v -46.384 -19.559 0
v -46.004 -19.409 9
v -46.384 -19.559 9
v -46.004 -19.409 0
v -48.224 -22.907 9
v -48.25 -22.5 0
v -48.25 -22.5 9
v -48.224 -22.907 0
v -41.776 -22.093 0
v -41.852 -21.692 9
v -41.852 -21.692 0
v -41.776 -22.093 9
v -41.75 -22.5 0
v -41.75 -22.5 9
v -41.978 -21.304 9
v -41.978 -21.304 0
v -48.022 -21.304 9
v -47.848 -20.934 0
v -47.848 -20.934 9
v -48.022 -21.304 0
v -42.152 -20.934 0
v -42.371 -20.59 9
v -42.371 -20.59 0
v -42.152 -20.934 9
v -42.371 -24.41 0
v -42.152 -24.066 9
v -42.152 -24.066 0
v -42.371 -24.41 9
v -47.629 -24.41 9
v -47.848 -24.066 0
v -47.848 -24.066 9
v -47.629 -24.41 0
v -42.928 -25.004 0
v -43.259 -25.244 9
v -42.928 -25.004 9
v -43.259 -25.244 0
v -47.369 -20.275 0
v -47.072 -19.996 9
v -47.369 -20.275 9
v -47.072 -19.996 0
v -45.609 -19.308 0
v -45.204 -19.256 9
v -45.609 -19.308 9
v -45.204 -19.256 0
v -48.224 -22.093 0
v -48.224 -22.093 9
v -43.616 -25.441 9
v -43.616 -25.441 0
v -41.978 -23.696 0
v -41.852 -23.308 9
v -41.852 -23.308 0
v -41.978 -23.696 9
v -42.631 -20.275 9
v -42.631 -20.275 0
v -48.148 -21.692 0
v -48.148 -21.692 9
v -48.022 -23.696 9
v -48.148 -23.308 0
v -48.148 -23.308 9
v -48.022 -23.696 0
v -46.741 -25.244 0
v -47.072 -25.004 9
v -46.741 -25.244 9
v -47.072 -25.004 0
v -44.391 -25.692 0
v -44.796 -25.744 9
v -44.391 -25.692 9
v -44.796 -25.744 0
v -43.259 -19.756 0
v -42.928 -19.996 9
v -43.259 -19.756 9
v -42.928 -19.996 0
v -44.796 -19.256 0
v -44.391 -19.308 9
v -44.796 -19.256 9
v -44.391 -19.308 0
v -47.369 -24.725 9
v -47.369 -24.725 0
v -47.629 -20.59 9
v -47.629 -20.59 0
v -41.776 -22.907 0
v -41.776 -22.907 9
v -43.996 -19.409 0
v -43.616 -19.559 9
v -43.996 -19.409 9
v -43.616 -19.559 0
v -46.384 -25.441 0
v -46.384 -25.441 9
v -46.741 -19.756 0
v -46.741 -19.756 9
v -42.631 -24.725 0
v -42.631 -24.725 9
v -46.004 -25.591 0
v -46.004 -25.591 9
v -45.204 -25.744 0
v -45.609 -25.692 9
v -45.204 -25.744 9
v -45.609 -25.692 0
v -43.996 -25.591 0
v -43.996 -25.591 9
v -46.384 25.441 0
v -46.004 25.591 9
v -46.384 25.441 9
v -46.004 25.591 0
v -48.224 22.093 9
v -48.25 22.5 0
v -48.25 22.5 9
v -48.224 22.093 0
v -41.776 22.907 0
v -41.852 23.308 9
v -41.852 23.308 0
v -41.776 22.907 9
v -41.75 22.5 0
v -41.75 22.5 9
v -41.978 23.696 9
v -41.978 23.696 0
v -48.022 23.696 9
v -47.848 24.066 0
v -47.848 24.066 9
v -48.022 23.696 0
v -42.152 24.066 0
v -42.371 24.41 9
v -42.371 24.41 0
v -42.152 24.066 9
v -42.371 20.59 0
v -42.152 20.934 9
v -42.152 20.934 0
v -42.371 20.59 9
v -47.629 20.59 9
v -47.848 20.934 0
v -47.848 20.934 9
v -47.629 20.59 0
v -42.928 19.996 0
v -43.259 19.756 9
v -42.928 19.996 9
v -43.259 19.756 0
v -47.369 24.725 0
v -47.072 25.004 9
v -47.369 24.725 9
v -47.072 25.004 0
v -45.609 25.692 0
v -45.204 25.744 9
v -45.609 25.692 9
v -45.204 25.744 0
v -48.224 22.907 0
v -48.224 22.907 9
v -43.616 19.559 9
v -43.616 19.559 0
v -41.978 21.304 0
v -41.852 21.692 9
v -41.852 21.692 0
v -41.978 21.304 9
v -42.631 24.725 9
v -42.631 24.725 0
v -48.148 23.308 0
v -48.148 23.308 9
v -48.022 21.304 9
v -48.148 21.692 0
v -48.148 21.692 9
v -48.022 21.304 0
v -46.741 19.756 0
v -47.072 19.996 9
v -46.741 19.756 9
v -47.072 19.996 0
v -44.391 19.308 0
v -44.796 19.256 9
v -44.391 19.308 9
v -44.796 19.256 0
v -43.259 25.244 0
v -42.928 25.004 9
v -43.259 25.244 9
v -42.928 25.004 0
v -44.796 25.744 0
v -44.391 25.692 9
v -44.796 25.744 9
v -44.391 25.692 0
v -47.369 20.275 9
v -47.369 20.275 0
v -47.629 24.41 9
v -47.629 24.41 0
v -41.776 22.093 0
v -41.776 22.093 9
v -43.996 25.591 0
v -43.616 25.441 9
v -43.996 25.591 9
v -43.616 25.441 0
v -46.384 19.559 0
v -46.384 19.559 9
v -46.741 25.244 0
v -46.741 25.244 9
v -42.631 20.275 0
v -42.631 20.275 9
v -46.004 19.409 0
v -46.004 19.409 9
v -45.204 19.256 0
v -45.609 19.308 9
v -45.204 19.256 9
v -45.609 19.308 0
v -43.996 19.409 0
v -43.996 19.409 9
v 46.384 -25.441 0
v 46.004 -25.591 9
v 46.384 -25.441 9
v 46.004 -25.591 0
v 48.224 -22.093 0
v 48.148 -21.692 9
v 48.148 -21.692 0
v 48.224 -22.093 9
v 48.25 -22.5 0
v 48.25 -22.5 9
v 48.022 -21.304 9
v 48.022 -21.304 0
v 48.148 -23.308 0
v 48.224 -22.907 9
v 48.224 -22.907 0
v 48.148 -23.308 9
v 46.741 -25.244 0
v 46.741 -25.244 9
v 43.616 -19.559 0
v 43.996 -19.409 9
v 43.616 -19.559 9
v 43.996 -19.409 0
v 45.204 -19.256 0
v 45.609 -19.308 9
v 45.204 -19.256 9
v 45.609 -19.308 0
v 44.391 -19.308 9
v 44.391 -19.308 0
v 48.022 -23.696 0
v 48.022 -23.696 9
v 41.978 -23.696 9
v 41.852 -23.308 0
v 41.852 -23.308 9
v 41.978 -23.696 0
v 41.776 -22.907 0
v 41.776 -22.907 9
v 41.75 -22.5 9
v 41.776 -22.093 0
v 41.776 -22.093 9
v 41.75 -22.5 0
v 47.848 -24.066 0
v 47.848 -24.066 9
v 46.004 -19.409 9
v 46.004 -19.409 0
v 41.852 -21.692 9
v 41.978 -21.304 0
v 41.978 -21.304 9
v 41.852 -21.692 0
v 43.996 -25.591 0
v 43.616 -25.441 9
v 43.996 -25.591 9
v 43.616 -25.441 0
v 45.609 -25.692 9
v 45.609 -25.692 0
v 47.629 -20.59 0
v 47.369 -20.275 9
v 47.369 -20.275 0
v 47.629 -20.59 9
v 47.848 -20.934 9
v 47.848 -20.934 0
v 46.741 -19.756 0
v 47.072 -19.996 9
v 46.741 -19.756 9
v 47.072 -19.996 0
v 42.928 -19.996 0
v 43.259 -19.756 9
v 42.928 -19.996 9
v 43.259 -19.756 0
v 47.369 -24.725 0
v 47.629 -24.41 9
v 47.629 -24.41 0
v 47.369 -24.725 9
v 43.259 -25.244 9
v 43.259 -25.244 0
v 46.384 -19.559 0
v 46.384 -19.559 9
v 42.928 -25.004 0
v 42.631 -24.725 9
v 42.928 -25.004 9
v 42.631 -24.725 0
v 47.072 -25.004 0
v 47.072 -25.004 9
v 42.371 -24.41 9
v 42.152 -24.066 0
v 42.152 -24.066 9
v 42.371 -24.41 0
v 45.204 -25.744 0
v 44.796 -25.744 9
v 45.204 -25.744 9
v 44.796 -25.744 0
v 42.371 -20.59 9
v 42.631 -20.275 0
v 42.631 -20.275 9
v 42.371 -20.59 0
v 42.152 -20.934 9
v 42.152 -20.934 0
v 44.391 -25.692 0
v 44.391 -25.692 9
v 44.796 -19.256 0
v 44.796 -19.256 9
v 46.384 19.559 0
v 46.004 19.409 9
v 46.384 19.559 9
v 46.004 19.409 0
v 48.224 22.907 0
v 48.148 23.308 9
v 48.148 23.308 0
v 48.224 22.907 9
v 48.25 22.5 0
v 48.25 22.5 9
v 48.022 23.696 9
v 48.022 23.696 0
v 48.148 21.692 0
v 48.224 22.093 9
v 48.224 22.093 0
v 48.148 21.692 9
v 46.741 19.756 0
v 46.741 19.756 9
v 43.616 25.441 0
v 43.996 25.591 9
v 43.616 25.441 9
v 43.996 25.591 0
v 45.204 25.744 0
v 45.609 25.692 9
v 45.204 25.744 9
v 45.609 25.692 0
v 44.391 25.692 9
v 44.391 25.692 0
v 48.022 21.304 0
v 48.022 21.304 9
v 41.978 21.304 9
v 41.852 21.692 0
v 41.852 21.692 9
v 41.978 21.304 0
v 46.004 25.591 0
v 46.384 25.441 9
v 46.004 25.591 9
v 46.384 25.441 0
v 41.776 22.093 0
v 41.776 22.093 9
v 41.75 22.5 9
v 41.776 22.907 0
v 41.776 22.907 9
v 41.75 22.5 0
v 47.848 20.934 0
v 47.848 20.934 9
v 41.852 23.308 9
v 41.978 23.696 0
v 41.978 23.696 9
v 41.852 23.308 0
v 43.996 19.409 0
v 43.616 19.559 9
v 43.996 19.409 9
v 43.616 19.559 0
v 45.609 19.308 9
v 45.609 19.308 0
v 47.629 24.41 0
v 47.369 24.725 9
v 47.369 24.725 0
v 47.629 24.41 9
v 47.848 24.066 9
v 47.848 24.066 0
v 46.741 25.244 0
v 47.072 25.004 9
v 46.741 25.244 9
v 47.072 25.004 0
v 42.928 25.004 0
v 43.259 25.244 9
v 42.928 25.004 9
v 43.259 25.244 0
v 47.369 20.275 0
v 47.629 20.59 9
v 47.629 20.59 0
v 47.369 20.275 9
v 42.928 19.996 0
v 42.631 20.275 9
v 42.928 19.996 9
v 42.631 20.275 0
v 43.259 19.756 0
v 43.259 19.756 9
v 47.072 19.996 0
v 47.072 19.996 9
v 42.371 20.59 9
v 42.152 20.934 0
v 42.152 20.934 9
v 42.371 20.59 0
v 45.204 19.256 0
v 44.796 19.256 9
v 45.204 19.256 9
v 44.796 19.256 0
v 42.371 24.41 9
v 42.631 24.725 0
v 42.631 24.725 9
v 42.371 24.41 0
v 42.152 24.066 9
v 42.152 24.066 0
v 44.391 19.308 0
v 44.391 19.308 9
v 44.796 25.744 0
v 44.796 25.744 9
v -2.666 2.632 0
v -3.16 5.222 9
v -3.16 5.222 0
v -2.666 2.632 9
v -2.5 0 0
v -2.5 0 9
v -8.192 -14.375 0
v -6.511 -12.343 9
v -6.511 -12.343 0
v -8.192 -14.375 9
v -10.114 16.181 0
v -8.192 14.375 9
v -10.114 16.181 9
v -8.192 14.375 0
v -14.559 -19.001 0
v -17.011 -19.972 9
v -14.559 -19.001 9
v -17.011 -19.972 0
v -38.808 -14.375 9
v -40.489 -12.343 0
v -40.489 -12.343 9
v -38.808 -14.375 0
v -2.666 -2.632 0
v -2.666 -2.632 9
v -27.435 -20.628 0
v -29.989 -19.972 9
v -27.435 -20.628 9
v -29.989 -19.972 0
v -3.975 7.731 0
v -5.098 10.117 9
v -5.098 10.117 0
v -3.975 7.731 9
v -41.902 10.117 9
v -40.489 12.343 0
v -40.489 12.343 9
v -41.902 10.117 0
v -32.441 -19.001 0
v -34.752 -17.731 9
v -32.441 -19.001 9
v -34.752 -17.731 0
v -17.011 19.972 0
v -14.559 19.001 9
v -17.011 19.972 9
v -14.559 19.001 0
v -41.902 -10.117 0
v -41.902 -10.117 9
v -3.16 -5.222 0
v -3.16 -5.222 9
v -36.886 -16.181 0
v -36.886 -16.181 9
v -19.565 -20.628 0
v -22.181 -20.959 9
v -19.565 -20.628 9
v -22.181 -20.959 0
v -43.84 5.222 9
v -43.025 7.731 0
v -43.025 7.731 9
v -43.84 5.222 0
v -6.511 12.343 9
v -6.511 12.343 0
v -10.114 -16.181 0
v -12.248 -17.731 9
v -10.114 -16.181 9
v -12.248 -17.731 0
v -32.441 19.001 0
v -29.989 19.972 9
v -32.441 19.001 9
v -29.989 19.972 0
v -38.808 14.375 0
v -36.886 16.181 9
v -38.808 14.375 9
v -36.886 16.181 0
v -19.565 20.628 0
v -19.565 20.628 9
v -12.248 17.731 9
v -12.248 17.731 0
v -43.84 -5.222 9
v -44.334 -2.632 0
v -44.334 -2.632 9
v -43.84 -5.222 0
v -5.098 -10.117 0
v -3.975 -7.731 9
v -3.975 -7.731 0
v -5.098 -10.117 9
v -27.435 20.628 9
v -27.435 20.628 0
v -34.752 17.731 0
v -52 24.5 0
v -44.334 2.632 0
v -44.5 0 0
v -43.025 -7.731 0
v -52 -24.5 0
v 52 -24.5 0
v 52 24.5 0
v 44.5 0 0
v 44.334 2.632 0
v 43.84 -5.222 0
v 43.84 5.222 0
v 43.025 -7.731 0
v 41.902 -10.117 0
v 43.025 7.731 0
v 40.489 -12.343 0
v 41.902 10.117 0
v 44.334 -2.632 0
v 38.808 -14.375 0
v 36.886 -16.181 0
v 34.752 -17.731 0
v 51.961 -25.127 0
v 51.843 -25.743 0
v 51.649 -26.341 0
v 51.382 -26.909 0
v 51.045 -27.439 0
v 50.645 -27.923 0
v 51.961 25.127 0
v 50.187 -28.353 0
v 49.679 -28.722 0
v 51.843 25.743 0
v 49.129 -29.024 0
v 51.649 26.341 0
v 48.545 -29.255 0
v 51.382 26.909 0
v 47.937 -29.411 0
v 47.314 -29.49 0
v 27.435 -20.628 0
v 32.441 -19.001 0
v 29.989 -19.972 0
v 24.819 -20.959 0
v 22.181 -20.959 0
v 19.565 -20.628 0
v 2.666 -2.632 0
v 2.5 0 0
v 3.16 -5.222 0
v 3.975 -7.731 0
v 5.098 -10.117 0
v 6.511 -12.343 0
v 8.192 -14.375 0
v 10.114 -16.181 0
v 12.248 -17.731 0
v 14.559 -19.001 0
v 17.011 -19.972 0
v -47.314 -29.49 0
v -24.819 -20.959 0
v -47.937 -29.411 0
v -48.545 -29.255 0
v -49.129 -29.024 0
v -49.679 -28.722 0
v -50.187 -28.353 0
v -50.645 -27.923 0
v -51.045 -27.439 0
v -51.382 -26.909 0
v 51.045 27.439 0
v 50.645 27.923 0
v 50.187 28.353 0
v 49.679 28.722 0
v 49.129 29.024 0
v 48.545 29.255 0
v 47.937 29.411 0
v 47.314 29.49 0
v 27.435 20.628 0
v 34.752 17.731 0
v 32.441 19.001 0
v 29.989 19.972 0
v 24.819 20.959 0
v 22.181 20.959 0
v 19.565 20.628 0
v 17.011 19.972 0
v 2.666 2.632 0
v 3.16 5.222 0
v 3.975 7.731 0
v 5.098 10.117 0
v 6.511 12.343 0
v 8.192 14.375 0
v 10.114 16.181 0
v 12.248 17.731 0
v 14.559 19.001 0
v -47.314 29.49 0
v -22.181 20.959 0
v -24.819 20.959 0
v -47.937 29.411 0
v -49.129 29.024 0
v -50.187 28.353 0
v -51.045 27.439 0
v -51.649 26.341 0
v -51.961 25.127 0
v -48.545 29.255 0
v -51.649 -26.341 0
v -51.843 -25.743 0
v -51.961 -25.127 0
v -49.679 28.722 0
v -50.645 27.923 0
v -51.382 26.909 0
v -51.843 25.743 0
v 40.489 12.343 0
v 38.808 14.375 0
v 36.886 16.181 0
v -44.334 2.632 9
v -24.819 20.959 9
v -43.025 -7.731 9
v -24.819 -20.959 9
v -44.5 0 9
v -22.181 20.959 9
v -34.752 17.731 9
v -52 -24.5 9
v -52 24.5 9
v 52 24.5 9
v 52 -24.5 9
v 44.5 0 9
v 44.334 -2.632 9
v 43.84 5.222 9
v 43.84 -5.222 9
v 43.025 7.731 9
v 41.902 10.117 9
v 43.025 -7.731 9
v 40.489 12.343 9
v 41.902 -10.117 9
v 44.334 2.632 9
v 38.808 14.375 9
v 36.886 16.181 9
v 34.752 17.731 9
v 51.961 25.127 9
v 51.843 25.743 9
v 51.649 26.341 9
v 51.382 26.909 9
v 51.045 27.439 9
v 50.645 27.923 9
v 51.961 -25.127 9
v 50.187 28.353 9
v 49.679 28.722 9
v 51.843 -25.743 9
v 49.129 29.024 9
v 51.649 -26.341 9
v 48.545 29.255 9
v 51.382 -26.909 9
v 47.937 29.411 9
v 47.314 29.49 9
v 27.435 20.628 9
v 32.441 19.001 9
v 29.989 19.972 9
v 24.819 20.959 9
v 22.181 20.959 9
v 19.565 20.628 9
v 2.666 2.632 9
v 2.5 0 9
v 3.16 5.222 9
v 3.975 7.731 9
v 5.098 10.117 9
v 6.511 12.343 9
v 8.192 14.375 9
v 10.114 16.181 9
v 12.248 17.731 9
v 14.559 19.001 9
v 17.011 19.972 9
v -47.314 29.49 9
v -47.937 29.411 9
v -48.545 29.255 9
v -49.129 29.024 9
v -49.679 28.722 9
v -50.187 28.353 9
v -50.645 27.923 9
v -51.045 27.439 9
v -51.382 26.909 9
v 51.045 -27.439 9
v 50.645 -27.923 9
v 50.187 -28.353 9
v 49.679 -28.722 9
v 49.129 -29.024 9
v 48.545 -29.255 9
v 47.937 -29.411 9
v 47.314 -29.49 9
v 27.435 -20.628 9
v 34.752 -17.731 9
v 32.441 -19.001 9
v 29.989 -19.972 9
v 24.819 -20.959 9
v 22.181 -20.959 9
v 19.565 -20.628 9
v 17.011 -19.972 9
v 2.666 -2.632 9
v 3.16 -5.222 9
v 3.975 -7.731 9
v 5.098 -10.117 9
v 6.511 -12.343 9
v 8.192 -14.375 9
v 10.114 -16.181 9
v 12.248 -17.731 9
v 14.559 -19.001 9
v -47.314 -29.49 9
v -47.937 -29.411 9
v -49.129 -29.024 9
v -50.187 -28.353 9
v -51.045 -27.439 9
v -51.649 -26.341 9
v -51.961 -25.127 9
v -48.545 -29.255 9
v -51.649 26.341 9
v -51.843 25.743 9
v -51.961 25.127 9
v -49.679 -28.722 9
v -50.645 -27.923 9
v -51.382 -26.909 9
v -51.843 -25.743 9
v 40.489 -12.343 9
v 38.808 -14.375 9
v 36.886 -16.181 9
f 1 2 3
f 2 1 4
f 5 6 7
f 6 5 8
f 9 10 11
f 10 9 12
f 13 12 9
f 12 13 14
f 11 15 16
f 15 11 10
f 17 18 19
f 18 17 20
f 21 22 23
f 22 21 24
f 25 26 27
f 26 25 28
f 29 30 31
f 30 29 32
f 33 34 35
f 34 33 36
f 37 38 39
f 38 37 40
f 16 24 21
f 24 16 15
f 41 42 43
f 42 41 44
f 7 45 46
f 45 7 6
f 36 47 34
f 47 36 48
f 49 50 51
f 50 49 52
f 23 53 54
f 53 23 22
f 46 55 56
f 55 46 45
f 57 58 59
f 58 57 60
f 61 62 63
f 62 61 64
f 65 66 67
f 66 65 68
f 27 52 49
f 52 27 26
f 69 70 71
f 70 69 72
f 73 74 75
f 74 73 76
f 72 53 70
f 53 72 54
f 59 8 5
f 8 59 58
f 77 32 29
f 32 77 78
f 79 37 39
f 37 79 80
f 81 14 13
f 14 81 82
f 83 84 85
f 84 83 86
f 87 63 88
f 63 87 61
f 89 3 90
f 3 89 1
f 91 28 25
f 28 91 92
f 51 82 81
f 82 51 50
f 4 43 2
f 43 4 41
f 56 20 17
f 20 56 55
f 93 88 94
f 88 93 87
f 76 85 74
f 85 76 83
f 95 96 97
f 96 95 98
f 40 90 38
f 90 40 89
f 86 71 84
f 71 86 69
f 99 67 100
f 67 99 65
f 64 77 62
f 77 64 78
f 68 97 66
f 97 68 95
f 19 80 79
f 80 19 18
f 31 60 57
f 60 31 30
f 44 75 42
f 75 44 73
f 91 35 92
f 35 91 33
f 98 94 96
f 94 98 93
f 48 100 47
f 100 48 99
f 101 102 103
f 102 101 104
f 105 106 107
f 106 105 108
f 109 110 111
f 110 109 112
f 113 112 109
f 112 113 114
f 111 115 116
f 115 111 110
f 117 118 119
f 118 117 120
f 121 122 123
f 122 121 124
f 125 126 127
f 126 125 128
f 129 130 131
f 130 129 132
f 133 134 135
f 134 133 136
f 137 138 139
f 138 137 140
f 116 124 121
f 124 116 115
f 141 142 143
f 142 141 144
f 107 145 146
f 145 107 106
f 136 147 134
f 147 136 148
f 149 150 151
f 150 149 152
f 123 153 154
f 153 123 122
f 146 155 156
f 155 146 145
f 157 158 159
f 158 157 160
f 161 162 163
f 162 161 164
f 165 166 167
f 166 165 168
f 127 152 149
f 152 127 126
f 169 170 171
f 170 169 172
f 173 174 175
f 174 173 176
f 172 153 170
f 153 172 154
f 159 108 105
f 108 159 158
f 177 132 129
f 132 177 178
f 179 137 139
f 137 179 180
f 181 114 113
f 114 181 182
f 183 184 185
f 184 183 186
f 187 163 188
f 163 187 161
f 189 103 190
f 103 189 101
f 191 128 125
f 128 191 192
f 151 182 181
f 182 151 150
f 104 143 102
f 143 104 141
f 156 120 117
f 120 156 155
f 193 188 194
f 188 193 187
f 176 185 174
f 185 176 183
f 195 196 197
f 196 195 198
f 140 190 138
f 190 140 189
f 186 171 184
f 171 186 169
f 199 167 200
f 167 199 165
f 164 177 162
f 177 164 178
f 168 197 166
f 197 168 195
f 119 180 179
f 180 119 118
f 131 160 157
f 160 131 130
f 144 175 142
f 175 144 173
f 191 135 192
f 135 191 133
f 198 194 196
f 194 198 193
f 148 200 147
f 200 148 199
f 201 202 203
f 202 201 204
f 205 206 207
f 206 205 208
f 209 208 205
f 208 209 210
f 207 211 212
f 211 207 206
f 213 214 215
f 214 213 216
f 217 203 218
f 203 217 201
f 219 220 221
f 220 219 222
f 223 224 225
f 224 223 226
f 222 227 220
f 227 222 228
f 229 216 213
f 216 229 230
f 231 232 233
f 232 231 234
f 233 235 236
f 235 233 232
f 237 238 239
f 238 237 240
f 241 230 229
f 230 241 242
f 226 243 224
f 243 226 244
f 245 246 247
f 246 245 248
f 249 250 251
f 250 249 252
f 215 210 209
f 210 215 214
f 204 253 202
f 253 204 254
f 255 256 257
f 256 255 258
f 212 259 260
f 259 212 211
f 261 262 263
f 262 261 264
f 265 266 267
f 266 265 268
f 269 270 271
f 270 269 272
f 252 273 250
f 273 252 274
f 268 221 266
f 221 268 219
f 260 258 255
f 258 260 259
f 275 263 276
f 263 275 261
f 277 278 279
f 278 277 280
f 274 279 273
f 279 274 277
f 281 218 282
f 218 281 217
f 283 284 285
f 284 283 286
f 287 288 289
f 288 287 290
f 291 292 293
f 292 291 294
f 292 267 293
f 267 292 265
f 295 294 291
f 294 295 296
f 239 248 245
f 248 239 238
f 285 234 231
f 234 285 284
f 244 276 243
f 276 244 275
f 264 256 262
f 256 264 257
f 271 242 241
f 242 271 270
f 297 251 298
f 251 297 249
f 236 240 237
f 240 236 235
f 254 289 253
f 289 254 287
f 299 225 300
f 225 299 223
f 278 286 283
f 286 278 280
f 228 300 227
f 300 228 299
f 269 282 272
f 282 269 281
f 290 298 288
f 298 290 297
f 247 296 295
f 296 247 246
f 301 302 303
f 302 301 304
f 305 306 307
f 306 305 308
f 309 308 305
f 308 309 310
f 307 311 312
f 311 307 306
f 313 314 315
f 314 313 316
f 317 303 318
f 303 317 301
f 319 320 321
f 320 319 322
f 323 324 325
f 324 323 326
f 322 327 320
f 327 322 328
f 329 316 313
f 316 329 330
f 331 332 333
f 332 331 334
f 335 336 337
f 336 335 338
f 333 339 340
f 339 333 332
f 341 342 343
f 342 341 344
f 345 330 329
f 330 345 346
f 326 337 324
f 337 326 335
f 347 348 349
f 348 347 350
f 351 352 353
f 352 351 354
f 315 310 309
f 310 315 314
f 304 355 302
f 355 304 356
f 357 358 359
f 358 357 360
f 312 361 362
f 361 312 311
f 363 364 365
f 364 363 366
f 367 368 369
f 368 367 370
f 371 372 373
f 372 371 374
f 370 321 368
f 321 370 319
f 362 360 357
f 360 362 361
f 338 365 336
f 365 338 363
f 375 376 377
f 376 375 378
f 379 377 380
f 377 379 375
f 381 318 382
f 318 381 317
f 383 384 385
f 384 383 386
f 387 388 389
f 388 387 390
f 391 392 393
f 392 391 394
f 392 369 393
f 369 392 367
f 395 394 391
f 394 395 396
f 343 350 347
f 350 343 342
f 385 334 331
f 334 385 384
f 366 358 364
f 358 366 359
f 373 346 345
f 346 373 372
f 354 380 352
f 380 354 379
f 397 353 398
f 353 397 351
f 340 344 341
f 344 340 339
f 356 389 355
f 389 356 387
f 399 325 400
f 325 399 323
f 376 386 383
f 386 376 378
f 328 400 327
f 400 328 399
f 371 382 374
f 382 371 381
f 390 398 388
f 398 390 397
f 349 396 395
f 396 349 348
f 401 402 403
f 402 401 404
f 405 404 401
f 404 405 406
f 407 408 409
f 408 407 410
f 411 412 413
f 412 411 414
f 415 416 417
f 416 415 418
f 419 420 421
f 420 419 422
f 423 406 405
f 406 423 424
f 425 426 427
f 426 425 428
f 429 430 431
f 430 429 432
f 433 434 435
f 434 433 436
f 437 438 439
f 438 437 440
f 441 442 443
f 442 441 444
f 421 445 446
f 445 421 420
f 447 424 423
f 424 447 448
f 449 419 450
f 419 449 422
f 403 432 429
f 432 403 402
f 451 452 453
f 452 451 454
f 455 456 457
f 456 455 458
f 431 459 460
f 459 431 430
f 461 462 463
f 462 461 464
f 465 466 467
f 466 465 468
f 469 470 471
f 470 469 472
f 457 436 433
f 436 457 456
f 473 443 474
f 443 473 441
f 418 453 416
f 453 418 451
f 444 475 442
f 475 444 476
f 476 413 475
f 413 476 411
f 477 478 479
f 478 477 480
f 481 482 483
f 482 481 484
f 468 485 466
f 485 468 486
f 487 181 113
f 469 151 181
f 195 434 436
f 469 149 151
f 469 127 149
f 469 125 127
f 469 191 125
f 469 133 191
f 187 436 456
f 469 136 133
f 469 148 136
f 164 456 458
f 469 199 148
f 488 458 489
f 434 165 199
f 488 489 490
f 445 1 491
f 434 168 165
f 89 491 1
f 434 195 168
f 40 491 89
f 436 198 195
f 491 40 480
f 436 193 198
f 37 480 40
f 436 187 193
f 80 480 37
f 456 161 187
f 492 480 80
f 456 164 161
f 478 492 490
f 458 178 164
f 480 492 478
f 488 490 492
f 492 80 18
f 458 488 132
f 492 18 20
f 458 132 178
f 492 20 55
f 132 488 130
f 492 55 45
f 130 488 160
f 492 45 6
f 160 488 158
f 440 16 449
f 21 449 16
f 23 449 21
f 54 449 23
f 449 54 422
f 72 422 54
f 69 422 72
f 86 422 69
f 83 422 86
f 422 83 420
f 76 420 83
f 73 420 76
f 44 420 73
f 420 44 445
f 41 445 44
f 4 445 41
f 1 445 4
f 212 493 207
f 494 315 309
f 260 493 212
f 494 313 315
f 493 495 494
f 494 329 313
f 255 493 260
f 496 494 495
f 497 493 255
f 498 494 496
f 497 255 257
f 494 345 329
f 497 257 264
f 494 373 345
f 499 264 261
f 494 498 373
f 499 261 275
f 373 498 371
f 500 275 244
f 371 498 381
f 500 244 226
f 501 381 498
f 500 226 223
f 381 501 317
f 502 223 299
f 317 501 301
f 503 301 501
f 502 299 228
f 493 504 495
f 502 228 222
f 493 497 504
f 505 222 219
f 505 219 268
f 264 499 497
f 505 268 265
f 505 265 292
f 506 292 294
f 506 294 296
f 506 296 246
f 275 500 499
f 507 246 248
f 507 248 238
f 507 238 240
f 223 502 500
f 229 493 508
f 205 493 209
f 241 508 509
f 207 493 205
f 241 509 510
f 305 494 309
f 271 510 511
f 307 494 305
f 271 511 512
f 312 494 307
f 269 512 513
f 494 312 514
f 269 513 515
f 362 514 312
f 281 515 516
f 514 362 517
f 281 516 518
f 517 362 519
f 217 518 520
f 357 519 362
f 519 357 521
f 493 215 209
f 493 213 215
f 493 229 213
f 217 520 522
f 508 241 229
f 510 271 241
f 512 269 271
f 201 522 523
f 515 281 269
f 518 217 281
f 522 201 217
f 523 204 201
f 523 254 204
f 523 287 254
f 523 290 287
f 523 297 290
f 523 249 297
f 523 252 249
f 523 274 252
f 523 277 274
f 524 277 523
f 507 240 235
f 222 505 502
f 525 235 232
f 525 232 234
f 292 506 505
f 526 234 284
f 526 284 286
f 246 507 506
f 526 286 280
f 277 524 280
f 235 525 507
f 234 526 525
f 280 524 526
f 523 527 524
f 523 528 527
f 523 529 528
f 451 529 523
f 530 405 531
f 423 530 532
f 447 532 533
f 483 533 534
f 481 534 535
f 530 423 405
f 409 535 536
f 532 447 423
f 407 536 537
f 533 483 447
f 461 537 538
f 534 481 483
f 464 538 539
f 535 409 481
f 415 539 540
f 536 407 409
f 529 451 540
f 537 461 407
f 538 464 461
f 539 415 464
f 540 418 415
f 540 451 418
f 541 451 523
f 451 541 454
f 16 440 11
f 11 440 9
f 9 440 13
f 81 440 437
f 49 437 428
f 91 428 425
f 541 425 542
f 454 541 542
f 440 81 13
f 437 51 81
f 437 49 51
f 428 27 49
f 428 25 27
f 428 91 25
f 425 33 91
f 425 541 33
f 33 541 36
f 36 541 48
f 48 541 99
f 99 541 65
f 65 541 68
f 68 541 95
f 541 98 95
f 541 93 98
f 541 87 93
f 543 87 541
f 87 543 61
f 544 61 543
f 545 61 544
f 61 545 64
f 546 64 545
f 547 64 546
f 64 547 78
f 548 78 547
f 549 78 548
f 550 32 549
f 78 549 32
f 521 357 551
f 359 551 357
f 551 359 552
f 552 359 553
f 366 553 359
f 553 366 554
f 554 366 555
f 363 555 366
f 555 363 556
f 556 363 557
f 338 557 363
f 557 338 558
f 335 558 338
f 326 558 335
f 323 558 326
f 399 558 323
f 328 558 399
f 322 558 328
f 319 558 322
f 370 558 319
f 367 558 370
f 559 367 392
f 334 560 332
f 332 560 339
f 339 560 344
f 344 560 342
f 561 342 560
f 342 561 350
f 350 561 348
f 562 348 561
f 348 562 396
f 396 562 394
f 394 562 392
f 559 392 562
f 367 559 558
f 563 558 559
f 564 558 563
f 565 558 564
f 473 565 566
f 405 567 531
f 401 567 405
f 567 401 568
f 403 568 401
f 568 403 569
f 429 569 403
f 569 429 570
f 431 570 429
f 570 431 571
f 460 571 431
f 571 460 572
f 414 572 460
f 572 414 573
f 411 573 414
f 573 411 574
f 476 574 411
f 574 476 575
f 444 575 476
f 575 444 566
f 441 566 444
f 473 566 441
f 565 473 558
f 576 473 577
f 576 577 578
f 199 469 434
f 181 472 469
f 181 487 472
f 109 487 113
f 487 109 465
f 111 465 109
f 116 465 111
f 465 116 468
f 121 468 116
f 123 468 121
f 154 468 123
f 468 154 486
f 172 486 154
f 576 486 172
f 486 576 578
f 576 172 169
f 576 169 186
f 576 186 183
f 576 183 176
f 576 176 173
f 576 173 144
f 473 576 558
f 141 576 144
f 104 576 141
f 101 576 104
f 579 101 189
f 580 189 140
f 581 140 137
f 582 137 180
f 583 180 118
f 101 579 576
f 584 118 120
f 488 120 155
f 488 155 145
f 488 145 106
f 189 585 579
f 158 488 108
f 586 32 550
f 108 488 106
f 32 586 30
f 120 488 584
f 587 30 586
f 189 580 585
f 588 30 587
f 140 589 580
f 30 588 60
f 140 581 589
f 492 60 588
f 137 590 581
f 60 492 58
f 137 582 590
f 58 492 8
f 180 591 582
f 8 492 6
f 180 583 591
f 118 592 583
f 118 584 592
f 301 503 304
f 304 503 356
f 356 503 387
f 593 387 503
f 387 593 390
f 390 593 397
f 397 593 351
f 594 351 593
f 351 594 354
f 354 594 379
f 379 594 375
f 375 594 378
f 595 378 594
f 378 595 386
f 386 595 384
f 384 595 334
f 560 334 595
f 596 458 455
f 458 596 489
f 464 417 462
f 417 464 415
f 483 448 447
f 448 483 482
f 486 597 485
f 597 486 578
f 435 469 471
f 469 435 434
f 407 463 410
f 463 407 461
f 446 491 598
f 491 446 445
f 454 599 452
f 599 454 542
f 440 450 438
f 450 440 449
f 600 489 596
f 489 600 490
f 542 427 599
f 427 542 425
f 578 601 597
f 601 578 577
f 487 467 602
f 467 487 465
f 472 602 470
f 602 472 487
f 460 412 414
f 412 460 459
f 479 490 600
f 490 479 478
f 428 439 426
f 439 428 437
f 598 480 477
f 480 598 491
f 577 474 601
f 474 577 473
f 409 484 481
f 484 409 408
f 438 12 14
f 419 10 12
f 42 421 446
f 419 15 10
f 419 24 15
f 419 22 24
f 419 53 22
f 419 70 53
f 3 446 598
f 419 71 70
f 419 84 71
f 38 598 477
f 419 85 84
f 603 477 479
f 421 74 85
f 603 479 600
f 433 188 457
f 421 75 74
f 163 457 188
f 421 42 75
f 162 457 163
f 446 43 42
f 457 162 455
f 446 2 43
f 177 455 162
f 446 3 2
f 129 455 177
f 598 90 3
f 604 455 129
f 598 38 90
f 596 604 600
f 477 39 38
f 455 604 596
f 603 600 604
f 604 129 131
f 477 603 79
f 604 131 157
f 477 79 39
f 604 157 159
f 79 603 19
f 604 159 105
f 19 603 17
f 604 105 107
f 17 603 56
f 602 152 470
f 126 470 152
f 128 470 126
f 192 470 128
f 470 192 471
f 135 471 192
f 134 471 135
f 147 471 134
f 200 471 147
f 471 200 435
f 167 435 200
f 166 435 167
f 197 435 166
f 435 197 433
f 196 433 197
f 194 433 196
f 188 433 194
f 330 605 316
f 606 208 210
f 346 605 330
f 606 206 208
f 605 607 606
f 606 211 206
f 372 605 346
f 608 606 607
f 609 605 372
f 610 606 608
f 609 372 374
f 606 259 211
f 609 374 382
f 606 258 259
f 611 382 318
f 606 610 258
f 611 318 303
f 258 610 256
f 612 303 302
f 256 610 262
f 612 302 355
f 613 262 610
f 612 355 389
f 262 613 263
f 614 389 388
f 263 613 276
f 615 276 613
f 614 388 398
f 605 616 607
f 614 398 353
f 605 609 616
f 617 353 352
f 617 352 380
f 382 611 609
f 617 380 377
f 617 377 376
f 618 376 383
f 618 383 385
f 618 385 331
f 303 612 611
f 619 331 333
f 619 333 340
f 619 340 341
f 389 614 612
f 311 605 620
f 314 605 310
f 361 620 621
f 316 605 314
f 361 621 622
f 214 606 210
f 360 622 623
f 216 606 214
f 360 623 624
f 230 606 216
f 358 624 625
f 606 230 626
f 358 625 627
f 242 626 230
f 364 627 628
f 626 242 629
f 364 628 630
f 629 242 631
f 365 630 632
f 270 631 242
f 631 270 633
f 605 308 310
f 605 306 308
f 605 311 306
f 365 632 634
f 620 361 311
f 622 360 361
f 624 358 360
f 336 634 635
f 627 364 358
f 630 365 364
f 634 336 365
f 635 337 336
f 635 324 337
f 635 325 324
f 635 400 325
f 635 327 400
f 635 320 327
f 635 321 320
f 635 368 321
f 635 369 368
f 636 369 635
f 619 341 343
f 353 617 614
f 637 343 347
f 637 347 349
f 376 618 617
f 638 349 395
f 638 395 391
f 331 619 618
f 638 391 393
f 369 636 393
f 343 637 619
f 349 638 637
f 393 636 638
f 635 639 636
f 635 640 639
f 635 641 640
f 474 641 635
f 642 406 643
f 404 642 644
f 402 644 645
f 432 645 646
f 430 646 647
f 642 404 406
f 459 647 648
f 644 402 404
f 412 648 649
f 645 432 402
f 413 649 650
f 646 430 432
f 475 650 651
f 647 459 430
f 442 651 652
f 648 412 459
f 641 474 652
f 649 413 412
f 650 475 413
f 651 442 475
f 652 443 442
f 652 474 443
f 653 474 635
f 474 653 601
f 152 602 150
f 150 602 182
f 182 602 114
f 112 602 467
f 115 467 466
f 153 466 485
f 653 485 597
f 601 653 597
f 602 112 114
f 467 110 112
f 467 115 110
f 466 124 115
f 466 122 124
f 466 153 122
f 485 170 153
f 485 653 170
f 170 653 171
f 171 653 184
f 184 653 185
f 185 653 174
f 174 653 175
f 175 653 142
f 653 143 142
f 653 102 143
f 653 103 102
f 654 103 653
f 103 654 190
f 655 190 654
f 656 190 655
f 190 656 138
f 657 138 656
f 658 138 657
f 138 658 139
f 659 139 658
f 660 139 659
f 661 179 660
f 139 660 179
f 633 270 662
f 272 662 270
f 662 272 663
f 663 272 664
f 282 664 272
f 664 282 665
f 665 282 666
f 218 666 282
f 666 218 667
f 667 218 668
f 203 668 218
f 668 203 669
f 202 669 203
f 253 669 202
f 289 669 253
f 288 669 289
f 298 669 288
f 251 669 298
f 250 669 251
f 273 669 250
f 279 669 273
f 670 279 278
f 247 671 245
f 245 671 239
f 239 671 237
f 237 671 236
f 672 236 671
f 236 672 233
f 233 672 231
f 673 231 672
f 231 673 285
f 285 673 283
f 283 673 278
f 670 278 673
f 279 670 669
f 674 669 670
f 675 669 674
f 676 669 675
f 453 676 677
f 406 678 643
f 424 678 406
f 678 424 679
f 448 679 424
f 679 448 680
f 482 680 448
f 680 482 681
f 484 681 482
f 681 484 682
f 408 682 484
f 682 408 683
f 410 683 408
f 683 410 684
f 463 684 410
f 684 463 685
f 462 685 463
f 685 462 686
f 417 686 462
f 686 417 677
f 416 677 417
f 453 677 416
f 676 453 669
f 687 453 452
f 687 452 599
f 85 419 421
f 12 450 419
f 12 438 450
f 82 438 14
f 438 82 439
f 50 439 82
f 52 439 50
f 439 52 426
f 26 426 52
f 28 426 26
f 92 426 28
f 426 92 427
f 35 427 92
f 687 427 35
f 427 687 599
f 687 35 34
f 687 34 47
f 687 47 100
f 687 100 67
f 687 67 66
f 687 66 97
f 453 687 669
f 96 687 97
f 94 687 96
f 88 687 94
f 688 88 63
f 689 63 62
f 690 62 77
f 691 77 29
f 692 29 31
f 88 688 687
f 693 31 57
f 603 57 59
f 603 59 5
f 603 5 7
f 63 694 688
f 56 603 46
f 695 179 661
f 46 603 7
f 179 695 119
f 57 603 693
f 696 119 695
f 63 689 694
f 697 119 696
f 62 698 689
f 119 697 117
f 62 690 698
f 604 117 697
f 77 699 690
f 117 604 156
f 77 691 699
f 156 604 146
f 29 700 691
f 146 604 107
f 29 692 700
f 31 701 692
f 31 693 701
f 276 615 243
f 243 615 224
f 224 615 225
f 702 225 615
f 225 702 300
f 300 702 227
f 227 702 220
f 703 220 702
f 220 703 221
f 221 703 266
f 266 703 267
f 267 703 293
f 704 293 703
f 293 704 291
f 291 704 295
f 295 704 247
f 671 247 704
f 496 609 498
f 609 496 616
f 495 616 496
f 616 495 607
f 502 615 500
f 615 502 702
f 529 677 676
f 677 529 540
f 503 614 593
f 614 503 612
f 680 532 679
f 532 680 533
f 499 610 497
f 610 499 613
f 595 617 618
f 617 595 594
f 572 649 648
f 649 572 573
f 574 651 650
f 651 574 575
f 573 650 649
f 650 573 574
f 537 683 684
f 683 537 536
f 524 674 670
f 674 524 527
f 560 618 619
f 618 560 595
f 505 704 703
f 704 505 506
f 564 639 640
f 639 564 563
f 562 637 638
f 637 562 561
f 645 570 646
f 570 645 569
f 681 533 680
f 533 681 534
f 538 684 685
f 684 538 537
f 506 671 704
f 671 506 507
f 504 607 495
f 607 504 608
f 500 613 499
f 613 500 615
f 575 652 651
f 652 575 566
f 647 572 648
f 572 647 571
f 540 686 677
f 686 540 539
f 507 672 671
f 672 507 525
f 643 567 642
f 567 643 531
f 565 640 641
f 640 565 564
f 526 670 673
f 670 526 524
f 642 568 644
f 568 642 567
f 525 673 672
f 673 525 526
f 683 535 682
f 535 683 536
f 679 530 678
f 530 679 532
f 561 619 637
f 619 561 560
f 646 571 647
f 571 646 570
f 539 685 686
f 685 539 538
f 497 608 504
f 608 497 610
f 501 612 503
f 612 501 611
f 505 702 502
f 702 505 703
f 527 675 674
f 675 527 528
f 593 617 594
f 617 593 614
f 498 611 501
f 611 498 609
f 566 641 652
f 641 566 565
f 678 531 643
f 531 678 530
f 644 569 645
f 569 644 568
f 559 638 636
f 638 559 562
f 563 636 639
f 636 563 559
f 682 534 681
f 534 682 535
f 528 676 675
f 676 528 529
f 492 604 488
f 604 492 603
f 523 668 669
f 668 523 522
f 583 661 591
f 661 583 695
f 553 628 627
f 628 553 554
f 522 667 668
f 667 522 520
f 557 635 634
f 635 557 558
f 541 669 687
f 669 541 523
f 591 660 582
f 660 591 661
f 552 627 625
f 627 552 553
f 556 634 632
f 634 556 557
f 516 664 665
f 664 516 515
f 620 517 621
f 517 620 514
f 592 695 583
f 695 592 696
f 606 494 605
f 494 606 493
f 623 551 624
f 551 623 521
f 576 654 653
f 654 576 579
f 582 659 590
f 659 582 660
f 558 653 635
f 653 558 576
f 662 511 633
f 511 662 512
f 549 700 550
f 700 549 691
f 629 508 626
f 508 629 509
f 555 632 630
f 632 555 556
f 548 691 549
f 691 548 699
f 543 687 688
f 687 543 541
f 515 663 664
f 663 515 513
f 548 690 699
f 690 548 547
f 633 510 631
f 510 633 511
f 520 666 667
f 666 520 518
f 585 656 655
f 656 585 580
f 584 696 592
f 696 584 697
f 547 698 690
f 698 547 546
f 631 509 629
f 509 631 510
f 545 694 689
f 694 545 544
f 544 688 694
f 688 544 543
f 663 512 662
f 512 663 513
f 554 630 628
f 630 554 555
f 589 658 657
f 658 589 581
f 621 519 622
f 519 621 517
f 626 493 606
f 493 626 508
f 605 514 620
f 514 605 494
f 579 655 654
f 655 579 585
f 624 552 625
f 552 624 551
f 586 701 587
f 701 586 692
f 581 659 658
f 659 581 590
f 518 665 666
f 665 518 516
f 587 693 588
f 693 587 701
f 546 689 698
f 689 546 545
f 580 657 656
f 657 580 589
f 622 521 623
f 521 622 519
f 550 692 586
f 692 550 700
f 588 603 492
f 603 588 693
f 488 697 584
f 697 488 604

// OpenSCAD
$fn = 50;

difference() {
	union() {
		hull() {
			translate(v = [-47.0, 24.5, 0]) {
				cylinder(h = 9, r = 5);
			}
			translate(v = [47.0, 24.5, 0]) {
				cylinder(h = 9, r = 5);
			}
			translate(v = [-47.0, -24.5, 0]) {
				cylinder(h = 9, r = 5);
			}
			translate(v = [47.0, -24.5, 0]) {
				cylinder(h = 9, r = 5);
			}
		}
	}
	union() {
		translate(v = [-45.0, -22.5, -100.0]) {
			cylinder(h = 200, r = 3.25);
		}
		translate(v = [-45.0, 22.5, -100.0]) {
			cylinder(h = 200, r = 3.25);
		}
		translate(v = [45.0, -22.5, -100.0]) {
			cylinder(h = 200, r = 3.25);
		}
		translate(v = [45.0, 22.5, -100.0]) {
			cylinder(h = 200, r = 3.25);
		}
		translate(v = [-45.0, -22.5, -100.0]) {
			cylinder(h = 200, r = 1.8);
		}
		translate(v = [-45.0, 22.5, -100.0]) {
			cylinder(h = 200, r = 1.8);
		}
		translate(v = [45.0, -22.5, -100.0]) {
			cylinder(h = 200, r = 1.8);
		}
		translate(v = [45.0, 22.5, -100.0]) {
			cylinder(h = 200, r = 1.8);
		}
		translate(v = [-23.5, 0, 0.0]) {
			cylinder(h = 9, r = 21.0);
		}
		translate(v = [23.5, 0, 0.0]) {
			cylinder(h = 9, r = 21.0);
		}
	}
}
